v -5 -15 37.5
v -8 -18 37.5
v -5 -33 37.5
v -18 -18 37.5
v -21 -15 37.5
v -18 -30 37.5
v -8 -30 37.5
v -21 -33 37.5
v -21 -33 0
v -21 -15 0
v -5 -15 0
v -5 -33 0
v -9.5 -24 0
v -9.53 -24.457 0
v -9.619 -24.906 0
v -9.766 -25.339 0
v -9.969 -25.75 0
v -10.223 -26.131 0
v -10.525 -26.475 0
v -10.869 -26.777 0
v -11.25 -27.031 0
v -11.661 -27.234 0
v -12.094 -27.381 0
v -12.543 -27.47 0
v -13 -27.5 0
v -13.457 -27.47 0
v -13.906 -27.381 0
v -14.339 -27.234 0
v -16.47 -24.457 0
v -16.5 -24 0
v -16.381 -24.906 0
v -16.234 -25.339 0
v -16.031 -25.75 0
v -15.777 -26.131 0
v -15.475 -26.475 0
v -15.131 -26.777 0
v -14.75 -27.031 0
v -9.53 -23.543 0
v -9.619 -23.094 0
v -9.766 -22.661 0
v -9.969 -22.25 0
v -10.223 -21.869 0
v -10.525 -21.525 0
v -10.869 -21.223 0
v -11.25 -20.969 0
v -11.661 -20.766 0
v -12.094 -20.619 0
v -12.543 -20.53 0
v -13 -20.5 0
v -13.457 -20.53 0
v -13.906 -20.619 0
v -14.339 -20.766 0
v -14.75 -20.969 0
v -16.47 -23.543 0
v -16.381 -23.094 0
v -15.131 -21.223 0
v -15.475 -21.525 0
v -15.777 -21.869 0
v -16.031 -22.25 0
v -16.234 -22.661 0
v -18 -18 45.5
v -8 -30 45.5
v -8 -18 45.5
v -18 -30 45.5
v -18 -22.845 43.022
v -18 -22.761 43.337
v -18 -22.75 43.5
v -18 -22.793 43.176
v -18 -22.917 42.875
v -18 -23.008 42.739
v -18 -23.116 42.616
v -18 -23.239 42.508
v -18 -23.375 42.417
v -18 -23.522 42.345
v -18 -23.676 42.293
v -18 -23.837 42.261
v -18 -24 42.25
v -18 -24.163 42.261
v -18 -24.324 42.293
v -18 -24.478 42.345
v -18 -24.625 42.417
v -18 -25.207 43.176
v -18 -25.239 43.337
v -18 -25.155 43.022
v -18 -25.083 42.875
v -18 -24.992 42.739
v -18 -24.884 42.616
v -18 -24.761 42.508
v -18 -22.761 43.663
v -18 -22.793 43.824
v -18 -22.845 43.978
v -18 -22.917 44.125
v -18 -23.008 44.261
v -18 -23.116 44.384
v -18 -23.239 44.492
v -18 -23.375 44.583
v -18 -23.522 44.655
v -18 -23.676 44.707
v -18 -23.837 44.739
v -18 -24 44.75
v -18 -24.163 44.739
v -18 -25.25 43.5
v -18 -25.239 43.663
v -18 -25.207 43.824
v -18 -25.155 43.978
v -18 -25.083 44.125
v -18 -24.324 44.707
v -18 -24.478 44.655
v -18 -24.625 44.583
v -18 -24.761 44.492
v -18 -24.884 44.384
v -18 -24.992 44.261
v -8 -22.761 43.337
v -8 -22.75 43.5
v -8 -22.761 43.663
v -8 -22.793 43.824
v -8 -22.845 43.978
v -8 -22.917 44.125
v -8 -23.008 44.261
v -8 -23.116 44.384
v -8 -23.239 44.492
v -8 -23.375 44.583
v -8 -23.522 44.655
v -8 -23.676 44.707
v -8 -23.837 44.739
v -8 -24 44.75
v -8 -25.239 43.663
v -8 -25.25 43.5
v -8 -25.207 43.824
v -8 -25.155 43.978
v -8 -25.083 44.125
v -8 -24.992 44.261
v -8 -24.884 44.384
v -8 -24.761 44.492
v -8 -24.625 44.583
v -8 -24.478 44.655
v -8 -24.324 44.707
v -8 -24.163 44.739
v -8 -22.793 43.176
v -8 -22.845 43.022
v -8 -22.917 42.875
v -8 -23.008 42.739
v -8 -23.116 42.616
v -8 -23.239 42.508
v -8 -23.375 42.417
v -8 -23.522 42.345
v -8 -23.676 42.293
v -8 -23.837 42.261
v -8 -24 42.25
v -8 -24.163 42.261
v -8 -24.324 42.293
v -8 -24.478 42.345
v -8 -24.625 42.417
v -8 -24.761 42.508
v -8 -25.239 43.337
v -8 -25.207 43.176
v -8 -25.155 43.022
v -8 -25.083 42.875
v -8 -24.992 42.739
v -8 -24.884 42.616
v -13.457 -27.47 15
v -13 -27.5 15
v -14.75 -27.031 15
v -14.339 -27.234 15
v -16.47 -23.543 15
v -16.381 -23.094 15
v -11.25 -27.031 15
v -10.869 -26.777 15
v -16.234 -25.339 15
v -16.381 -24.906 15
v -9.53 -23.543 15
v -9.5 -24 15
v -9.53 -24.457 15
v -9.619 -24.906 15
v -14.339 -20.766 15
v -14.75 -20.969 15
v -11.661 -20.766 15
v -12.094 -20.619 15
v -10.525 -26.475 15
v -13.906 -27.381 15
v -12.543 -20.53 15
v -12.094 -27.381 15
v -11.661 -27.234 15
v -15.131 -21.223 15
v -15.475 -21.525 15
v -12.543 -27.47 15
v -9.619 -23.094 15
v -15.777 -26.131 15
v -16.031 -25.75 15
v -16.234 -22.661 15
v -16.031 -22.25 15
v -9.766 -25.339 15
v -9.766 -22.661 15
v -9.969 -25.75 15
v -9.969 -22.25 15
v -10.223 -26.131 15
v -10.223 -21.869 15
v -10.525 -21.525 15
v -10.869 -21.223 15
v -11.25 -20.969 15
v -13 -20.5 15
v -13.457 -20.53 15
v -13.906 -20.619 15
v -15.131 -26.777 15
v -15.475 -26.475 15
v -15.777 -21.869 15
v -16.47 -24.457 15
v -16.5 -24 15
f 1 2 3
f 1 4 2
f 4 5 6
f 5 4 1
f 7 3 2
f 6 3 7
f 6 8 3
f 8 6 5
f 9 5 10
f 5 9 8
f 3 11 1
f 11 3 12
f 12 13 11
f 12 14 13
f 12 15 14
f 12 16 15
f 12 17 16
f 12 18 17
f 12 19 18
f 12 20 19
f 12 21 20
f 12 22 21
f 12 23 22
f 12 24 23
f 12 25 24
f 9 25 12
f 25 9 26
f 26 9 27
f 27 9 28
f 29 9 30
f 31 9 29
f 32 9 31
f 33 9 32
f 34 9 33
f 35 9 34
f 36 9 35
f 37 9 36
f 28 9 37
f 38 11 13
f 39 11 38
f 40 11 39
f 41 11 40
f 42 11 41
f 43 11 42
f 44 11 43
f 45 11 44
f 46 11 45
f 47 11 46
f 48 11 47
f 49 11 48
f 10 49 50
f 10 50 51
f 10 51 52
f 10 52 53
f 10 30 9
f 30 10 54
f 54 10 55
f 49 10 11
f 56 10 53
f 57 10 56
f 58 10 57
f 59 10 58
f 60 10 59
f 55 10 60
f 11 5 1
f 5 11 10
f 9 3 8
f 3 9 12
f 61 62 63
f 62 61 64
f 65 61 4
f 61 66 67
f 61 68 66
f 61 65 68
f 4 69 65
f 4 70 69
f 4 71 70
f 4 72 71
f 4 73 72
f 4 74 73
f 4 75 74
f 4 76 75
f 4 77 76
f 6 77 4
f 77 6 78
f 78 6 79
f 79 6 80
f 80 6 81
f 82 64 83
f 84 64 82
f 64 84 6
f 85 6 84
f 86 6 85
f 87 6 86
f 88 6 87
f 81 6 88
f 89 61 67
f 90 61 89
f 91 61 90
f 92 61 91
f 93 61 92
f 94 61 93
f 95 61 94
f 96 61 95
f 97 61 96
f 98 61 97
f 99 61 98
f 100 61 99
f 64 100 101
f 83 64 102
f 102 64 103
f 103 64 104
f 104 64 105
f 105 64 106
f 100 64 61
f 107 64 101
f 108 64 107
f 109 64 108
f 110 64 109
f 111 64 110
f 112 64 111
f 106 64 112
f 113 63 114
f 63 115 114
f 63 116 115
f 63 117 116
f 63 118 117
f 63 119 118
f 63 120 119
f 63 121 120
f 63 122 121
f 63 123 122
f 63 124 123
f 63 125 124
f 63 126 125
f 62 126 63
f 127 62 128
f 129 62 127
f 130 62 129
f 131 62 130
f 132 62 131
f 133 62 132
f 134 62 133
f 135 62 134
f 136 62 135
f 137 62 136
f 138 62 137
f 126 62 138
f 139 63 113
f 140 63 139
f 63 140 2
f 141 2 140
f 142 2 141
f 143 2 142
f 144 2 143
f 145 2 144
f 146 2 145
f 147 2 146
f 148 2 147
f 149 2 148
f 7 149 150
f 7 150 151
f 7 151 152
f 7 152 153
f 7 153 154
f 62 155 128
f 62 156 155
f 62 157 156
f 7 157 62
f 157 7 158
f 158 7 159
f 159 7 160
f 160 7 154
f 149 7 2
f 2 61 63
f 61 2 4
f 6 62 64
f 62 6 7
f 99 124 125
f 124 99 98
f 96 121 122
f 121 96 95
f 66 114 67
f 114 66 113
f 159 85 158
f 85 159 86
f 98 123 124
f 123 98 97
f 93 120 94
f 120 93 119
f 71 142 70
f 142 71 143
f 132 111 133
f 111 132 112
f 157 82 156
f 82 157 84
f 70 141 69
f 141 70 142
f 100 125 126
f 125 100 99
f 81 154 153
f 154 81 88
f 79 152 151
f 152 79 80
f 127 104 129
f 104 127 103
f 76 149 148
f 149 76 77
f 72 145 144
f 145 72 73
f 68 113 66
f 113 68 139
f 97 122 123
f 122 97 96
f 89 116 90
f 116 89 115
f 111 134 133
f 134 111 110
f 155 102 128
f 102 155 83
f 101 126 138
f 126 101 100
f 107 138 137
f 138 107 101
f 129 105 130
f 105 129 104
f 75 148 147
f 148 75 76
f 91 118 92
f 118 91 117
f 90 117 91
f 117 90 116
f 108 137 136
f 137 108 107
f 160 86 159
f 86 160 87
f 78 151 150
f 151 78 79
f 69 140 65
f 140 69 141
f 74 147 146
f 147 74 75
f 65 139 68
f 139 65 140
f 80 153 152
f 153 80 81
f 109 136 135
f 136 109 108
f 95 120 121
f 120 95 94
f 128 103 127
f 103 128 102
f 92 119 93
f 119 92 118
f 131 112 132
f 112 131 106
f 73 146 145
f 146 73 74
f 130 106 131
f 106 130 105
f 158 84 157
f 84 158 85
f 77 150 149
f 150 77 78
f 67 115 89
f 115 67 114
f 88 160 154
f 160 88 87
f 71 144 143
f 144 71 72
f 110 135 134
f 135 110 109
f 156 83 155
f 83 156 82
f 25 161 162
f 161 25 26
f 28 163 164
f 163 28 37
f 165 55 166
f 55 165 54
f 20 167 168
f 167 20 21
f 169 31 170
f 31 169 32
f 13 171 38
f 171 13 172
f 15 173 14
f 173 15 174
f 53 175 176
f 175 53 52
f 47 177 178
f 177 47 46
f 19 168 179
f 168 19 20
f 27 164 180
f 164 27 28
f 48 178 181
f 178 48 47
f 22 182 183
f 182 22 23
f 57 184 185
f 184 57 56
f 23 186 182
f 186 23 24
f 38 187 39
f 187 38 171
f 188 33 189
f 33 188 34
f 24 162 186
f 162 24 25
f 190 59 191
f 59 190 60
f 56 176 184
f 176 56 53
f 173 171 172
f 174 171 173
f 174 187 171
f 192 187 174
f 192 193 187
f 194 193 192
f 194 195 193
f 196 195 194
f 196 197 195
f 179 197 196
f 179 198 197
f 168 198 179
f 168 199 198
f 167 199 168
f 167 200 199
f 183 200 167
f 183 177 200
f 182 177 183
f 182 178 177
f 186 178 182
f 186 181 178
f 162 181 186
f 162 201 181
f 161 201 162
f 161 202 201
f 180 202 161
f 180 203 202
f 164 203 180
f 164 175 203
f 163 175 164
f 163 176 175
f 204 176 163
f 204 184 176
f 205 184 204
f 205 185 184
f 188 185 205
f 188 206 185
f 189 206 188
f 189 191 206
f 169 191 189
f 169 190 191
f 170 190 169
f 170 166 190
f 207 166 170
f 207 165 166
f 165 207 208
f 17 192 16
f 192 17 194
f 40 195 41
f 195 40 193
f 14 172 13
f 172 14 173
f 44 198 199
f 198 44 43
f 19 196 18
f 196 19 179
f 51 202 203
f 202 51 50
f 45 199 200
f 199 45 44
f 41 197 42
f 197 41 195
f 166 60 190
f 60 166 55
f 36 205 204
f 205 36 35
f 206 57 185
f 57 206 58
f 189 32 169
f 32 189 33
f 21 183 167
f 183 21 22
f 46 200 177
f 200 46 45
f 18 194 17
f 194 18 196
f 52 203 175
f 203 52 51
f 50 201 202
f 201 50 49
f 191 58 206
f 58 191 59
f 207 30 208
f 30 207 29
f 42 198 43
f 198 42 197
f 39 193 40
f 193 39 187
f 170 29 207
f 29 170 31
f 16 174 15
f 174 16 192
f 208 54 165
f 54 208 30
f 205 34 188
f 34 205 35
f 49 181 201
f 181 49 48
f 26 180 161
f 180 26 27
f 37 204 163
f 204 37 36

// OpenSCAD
// plug_inlet.scad -- the AC inlet on each supply's face and the live supply's dummy power-cord plug
// (task.py: _psu_boxes INLET and PLUG), SUPPLY frame, mm.
//
// inlet_add() / inlet_cut() are used by psu_shell.scad: the inlet's raised face (INLET), a shallow recess in it the
// plug body fits into, a socket through the face and front wall into a boss behind it for the plug's tongue, and an
// M3 screw hole down through the boss into the tongue. The screw makes the plug rigid with its supply, as in task.py
// (knocking the plug moves the live supply). Only the live supply gets a plug; on the other two the socket is empty.
//
// PART = "plug"      the dummy C13 plug: a block PLUG with a tongue at its back, and an optional hole in its front
//                    for a short stub of cut power cord (no conductors connected, never plugged into anything).
//                    Printed standing on its front face.
//        "assembly"  in place.

include <params.scad>

PART = "plug";

module inlet_add() {
    box6(INLET);
    // boss behind the front wall, from the floor to the top of the inlet
    translate([FACE_X + WALL - EPS, PLUG[2], 0]) cube([INLET_BOSS_D + EPS, PLUG[3] - PLUG[2], INLET[5]]);
}

module inlet_cut() {
    // recess in the inlet's face: the plug body reaches the face plate, as in task.py
    translate([INLET[0] - EPS, PLUG[2] - FIT_SLIDE, PLUG[4] - FIT_SLIDE])
        cube([INLET[1] - INLET[0] + EPS, PLUG[3] - PLUG[2] + 2 * FIT_SLIDE, PLUG[5] - PLUG[4] + 2 * FIT_SLIDE]);
    // socket for the tongue
    translate([INLET[1] - EPS, PLUG[2] + PLUG_TONGUE_INSET - FIT_SLIDE, PLUG[4] + PLUG_TONGUE_INSET - FIT_SLIDE])
        cube([tongue_x1() - INLET[1] + FIT_SLIDE + EPS,
              PLUG[3] - PLUG[2] - 2 * PLUG_TONGUE_INSET + 2 * FIT_SLIDE,
              PLUG[5] - PLUG[4] - 2 * PLUG_TONGUE_INSET + 2 * FIT_SLIDE]);
    // screw from the top of the boss into the tongue
    translate([plug_screw_x(), plug_screw_y(), PLUG[5] - PLUG_TONGUE_INSET])
        cylinder(h = INLET[5] - (PLUG[5] - PLUG_TONGUE_INSET) + EPS, d = M3_CLEAR);
}

module plug() {
    difference() {
        union() {
            box6(PLUG);
            translate([PLUG[1] - EPS, PLUG[2] + PLUG_TONGUE_INSET, PLUG[4] + PLUG_TONGUE_INSET])
                cube([tongue_x1() - PLUG[1] + EPS, PLUG[3] - PLUG[2] - 2 * PLUG_TONGUE_INSET,
                      PLUG[5] - PLUG[4] - 2 * PLUG_TONGUE_INSET]);
        }
        translate([plug_screw_x(), plug_screw_y(), PLUG[4] - EPS]) cylinder(h = PLUG[5] - PLUG[4] + 2 * EPS, d = M3_PILOT);
        translate([PLUG[0] - EPS, plug_screw_y(), (PLUG[4] + PLUG[5]) / 2]) rotate([0, 90, 0])
            cylinder(h = CORD_DEPTH + EPS, d = CORD_D);
    }
}

if (PART == "plug") translate([0, 0, -PLUG[0]]) rotate([0, -90, 0]) plug();
else if (PART == "assembly") plug();
